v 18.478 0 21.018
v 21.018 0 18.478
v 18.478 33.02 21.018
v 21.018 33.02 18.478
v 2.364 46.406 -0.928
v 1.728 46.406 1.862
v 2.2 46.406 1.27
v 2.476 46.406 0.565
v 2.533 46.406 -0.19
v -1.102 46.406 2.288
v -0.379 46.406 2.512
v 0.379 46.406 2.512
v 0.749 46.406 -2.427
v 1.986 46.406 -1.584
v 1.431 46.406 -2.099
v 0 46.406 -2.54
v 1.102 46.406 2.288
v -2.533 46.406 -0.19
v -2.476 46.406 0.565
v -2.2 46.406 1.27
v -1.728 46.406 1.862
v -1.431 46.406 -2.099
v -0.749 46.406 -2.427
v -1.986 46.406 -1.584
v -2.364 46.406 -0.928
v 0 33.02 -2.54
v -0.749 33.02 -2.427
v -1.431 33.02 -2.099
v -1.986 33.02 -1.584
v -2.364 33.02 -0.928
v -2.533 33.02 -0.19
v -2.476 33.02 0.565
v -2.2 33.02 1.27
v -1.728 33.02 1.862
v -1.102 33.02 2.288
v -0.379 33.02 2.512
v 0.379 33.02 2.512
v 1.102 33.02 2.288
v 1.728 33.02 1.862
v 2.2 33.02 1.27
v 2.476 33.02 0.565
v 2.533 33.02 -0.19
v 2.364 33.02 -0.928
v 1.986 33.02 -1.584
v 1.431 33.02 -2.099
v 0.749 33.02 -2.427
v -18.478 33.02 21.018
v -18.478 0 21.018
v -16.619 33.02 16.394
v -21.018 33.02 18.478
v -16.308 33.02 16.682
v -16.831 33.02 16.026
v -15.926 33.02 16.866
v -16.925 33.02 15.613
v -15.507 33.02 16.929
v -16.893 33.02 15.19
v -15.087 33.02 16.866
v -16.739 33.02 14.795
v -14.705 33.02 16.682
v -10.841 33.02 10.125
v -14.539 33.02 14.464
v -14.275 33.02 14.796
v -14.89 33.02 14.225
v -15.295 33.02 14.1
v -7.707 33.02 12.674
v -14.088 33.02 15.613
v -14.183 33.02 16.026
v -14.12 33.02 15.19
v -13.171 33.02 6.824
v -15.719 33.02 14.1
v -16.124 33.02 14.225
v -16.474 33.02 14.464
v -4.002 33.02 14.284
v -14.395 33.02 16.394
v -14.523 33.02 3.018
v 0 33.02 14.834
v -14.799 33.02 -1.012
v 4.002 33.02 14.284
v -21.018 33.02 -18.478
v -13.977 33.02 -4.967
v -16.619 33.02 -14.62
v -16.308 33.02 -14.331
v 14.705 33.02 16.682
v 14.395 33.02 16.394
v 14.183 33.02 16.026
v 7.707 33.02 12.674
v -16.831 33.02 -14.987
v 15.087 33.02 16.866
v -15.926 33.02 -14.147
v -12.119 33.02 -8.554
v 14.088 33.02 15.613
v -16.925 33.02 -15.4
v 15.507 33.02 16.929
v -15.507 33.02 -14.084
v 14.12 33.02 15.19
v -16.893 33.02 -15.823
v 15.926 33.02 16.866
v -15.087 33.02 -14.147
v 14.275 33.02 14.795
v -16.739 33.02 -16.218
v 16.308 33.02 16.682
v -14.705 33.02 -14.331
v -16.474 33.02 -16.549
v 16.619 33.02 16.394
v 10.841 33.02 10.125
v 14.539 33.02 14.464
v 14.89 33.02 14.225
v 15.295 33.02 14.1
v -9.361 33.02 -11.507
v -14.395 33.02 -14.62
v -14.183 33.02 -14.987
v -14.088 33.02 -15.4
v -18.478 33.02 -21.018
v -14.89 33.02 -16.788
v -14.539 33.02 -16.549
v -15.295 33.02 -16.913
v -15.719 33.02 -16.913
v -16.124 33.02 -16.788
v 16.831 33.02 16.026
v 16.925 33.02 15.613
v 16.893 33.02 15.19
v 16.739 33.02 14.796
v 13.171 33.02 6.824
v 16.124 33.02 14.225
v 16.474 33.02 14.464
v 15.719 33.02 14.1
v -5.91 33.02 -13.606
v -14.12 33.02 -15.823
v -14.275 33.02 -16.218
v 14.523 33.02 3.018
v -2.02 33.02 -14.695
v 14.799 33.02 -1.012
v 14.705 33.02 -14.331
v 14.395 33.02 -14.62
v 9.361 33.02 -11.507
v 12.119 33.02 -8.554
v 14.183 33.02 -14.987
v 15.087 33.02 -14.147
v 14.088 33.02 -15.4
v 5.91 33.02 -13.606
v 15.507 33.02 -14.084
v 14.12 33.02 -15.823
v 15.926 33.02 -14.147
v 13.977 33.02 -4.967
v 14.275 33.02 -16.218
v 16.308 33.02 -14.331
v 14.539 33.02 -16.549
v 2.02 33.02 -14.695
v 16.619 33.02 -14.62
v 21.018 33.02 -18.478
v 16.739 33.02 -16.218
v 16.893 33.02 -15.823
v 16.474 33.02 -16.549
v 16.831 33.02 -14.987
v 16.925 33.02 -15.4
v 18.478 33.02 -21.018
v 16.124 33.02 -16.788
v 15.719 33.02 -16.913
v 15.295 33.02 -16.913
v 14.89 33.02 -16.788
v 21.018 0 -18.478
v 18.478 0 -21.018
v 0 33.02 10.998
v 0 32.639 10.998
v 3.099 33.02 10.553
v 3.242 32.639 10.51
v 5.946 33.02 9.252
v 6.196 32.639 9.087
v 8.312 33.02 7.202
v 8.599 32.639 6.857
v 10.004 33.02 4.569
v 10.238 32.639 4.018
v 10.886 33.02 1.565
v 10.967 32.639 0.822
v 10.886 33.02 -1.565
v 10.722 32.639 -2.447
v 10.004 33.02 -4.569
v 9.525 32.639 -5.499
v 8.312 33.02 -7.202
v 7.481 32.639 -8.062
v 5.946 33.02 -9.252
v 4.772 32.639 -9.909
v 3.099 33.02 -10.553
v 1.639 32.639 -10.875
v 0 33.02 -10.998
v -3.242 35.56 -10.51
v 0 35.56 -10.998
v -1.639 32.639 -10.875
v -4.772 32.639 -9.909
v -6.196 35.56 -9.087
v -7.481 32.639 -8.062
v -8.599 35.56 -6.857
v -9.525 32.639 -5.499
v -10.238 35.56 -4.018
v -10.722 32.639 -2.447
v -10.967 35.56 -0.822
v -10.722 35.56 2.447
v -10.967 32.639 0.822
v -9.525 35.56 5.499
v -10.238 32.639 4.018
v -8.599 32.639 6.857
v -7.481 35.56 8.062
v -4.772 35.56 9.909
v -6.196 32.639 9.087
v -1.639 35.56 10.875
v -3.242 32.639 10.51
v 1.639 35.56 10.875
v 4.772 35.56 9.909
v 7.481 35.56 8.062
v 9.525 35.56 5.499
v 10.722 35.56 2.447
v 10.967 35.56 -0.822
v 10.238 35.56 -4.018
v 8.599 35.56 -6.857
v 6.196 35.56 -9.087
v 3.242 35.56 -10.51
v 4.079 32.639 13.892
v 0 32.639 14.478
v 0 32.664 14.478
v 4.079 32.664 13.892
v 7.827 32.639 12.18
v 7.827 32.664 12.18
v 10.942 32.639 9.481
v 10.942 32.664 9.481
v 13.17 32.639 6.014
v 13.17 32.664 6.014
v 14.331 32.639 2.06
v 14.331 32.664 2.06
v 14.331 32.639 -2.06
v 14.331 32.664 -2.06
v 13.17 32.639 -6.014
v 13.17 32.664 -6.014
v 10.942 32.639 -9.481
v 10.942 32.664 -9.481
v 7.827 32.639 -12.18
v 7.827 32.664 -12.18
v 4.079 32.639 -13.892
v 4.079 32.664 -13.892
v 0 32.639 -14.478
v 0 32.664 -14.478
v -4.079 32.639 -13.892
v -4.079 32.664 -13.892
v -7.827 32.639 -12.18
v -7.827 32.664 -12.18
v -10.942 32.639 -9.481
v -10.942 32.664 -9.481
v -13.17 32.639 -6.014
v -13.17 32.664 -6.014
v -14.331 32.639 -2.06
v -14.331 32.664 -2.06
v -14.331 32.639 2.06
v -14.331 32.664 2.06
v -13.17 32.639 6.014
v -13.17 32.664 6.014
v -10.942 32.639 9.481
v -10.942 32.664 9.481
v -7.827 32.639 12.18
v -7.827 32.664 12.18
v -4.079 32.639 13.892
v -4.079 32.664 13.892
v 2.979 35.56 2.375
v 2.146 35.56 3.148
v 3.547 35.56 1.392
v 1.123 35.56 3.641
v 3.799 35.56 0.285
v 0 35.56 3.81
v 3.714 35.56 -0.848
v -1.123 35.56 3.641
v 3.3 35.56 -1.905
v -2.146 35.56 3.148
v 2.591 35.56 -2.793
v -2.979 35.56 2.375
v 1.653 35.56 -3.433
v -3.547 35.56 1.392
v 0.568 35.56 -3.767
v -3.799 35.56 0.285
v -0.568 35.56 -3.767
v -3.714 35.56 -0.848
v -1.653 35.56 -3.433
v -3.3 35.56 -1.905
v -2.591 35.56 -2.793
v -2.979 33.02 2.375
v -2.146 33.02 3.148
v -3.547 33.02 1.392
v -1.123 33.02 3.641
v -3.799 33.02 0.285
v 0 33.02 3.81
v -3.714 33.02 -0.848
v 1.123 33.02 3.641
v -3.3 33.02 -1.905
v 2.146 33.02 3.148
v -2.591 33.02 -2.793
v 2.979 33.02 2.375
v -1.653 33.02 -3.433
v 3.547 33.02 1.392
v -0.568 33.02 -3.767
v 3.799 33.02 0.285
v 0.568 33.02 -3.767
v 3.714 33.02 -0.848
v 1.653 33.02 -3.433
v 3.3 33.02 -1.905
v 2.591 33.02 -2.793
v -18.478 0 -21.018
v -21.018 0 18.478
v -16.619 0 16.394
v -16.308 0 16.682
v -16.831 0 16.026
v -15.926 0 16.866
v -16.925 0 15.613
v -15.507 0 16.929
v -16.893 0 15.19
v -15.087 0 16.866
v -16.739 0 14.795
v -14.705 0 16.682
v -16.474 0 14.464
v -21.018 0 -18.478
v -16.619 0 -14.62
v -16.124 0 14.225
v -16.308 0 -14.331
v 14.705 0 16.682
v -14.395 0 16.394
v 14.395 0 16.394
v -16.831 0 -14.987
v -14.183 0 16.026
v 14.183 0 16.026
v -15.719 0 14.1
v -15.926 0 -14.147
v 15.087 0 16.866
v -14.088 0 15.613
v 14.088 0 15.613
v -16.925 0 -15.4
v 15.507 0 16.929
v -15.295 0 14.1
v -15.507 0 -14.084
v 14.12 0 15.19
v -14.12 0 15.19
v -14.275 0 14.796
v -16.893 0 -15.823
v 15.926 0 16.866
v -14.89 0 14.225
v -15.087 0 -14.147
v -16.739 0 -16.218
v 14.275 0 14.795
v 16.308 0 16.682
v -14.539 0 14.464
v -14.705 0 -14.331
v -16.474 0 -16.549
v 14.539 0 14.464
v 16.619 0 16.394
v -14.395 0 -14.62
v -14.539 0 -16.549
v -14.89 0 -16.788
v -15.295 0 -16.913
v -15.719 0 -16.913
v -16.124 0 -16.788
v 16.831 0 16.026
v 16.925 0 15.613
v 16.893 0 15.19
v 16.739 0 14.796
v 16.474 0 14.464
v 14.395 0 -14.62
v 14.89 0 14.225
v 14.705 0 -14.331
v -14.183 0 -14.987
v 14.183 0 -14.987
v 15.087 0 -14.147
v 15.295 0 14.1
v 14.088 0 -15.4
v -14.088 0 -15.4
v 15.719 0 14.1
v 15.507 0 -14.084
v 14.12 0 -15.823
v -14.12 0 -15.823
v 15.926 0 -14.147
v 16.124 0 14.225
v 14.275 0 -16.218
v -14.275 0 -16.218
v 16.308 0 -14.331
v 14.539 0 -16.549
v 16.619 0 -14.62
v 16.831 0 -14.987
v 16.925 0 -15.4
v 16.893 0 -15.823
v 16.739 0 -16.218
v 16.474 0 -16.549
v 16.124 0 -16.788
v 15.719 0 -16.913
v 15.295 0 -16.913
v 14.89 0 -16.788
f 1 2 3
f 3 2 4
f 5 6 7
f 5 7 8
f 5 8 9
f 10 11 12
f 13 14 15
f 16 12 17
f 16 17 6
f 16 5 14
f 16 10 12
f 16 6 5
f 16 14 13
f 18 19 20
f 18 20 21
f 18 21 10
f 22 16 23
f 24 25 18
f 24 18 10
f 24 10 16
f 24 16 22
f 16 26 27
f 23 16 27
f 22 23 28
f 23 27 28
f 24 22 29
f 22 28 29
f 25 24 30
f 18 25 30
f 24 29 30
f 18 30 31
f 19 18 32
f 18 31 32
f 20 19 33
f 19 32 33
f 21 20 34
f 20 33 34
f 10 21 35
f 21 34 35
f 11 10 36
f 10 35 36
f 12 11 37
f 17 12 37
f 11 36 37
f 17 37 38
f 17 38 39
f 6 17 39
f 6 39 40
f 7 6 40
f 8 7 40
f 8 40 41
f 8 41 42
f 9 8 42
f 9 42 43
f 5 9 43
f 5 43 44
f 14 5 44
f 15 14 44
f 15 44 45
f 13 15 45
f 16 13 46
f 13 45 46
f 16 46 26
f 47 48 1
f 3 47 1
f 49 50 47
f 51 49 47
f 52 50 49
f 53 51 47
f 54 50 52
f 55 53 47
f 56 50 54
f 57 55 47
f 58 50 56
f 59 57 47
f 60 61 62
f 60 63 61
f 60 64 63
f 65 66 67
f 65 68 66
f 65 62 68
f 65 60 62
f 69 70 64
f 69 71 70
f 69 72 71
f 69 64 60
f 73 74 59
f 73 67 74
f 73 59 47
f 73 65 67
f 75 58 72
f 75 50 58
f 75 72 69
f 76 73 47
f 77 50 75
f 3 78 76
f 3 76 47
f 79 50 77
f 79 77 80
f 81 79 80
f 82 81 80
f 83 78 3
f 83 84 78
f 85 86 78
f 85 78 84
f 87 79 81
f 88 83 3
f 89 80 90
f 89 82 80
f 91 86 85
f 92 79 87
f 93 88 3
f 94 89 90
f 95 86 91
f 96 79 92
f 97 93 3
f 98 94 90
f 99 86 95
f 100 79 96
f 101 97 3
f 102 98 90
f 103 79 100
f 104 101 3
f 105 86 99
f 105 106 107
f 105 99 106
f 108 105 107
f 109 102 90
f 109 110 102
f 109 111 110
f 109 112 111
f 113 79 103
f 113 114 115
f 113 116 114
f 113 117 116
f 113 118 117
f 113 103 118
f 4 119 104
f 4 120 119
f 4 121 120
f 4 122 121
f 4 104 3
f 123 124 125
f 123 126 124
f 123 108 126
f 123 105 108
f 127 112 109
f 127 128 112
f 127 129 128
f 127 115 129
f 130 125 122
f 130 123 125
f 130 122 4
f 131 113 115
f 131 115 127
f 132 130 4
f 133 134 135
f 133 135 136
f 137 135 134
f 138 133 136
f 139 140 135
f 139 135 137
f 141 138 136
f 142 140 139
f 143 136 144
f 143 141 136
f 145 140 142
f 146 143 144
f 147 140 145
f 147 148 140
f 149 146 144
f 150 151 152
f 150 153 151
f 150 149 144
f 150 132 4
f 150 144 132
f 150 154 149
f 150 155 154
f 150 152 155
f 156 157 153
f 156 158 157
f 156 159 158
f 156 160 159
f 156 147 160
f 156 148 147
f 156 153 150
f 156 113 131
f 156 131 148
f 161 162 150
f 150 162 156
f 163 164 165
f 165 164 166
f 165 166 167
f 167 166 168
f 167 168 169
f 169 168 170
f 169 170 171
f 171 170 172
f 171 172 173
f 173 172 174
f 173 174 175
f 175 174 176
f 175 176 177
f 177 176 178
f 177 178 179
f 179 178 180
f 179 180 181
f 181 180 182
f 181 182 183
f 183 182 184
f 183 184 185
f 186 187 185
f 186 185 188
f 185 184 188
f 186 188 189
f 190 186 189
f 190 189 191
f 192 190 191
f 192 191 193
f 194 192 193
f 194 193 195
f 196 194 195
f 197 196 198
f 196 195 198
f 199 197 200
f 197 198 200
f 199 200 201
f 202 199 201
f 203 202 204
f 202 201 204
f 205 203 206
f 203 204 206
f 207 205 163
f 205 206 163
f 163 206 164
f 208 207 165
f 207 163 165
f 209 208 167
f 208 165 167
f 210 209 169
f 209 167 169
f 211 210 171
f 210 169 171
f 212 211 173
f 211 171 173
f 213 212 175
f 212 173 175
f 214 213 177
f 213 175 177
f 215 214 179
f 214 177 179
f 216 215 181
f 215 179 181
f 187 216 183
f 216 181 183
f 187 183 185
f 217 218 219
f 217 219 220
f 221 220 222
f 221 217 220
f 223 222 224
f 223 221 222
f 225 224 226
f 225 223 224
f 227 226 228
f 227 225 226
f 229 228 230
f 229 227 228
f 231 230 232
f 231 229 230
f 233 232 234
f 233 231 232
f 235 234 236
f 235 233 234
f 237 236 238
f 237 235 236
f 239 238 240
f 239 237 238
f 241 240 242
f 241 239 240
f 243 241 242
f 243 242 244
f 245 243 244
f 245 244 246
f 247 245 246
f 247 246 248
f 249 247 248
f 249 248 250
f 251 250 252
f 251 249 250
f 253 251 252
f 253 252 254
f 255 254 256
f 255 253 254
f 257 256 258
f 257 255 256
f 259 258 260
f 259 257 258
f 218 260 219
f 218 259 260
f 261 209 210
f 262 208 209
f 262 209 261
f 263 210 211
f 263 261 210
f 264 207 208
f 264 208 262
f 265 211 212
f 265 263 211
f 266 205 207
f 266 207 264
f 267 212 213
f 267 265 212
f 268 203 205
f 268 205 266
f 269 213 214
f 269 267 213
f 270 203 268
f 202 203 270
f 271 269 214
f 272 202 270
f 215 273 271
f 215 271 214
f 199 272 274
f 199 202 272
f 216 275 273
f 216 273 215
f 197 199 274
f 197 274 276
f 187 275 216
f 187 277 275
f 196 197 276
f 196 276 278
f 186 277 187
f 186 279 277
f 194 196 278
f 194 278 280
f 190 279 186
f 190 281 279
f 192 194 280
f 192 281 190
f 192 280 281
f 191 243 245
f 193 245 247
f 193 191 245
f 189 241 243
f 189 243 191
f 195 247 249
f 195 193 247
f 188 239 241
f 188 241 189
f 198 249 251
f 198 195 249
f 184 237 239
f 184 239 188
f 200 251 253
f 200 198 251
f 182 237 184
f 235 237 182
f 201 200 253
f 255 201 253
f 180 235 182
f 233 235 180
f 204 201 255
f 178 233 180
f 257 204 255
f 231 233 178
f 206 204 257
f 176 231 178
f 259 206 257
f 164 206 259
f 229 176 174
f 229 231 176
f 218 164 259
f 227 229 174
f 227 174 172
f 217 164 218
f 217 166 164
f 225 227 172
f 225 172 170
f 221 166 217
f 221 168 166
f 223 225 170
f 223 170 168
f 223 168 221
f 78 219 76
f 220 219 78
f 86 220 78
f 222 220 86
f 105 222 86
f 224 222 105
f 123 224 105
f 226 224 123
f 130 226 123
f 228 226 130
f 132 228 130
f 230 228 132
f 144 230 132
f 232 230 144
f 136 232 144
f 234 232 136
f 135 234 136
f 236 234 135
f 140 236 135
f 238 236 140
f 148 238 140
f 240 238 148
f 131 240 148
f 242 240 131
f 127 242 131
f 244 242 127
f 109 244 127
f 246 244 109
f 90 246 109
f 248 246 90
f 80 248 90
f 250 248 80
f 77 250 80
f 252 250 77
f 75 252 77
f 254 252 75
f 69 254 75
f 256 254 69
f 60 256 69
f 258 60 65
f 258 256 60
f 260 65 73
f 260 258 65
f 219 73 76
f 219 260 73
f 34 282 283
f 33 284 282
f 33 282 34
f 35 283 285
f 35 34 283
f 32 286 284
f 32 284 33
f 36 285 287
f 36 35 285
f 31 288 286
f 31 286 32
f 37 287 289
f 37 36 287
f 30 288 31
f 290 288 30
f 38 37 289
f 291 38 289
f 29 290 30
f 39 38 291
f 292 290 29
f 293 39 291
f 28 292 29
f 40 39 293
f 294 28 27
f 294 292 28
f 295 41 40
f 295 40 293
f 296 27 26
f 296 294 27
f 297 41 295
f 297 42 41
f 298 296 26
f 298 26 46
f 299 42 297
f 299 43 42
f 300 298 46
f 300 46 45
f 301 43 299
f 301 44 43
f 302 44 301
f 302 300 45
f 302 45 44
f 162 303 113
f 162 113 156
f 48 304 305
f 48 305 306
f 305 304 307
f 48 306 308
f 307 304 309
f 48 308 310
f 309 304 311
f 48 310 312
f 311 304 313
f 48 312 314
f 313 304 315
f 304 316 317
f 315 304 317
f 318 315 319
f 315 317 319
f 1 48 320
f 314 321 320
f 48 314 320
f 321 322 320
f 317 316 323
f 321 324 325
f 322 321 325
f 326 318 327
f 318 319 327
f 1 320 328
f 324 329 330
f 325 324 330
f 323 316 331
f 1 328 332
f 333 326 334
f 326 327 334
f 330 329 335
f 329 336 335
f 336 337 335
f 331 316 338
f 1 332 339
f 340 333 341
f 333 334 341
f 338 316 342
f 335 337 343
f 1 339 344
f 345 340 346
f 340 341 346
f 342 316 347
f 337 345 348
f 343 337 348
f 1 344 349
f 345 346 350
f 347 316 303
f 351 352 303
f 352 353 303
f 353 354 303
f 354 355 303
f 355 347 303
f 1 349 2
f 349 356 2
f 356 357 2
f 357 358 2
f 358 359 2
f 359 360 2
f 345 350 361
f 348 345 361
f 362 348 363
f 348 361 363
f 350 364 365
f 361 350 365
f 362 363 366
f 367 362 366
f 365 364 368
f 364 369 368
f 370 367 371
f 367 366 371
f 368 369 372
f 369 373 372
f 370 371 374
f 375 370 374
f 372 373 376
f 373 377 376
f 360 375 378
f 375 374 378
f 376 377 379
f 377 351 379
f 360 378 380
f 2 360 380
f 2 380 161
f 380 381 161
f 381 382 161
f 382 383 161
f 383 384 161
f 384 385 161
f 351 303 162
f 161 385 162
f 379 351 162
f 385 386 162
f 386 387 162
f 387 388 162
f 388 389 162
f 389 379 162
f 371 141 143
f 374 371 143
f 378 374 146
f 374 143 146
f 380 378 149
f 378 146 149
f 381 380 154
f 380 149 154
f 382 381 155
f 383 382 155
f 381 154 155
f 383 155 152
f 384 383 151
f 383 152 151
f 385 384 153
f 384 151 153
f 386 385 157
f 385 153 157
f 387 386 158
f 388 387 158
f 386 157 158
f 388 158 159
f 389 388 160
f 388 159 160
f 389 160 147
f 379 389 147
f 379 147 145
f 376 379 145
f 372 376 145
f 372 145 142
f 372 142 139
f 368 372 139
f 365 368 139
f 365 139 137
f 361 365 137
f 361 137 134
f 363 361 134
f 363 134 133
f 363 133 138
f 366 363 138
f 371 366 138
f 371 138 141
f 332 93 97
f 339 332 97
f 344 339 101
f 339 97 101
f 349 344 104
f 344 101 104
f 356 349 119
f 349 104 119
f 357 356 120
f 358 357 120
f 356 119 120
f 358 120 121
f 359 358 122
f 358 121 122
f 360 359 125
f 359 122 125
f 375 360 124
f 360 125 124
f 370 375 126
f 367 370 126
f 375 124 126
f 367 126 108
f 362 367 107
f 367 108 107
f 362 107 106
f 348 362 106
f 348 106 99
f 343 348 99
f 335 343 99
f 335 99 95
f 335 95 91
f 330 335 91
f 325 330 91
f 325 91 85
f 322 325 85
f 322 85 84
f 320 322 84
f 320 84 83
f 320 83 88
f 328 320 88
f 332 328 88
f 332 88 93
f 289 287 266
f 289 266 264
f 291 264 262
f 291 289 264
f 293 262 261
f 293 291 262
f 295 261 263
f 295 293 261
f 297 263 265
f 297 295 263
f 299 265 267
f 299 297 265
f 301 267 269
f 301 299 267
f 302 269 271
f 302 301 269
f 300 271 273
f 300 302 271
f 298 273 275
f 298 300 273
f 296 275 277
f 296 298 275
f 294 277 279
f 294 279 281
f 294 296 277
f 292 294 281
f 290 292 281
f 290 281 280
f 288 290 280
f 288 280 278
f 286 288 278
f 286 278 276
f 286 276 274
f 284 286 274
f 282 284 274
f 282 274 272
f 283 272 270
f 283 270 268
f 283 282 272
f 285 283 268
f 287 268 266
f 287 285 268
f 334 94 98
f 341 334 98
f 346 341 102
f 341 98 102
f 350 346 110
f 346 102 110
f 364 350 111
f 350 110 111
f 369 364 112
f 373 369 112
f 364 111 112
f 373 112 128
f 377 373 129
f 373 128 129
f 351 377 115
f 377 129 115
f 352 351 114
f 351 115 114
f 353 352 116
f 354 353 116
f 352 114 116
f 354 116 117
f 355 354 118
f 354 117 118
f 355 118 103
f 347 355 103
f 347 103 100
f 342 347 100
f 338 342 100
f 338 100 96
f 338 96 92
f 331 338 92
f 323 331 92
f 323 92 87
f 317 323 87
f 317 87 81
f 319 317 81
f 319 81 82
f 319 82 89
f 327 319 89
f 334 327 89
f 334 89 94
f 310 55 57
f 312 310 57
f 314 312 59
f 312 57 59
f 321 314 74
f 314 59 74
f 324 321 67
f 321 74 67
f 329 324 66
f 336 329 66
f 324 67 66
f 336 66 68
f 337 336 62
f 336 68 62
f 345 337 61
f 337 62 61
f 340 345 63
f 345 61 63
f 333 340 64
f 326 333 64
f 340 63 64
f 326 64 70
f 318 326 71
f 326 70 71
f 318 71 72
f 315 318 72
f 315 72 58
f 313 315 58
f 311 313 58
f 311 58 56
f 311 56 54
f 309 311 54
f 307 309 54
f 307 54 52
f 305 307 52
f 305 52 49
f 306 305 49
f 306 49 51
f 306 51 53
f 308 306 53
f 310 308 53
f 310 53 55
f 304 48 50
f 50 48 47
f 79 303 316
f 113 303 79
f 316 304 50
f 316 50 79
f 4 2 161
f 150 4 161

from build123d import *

# Parameters (mm, degrees)
SKETCH1_W           = 42.037
SKETCH1_H           = 42.037
BOSS_EXTRUDE1_DEPTH = 33.02
CHAMFER1_SIZE       = 2.54
SKETCH2_R           = 10.9982
SKETCH2_R_2         = 3.81
BOSS_EXTRUDE2_DEPTH = 2.54
CUT_EXTRUDE1_START  = -0.381
SKETCH3_R           = 14.478
SKETCH3_R_2         = 10.9982
CUT_EXTRUDE1_DEPTH  = 0.381
CHAMFER2_SIZE       = 0.3556
SKETCH4_R           = 2.54
BOSS_EXTRUDE3_DEPTH = 13.3858
SKETCH5_R           = 1.4224
CUT_EXTRUDE2_DEPTH  = 45.428313996


with BuildPart() as part:
    # Sketch1 → Boss-Extrude1 (new body)
    with BuildSketch(Plane(origin=(0, 0, 0), x_dir=(1, 0, 0), z_dir=(0, 1, 0))):
        Rectangle(SKETCH1_W, SKETCH1_H)
    extrude(amount=BOSS_EXTRUDE1_DEPTH)

    # Chamfer1
    chamfer1_edges = [part.edges().sort_by_distance(p)[0] for p in [
        (21.0185, 16.51, 21.0185),
        (-21.0185, 16.51, 21.0185),
        (-21.0185, 16.51, -21.0185),
        (21.0185, 16.51, -21.0185),
    ]]
    chamfer(chamfer1_edges, length=CHAMFER1_SIZE)

    # Sketch2 → Boss-Extrude2 (add)
    with BuildSketch(Plane(origin=(0, 33.02, 0), x_dir=(1, 0, 0), z_dir=(0, 1, 0))):
        with Locations(Location((0, 0, 0), (0, 0, 90))):
            Circle(SKETCH2_R)
        with Locations(Location((0, 0, 0), (0, 0, 270))):
            Circle(SKETCH2_R_2, mode=Mode.SUBTRACT)
    extrude(amount=BOSS_EXTRUDE2_DEPTH)

    # Sketch3 → Cut-Extrude1 (cut)
    with BuildSketch(Plane(origin=(0, 33.02, 0), x_dir=(1, 0, 0), z_dir=(0, 1, 0)).offset(CUT_EXTRUDE1_START)):
        with Locations(Location((0, 0, 0), (0, 0, 270))):
            Circle(SKETCH3_R)
        with Locations(Location((0, 0, 0), (0, 0, 270))):
            Circle(SKETCH3_R_2, mode=Mode.SUBTRACT)
    extrude(amount=CUT_EXTRUDE1_DEPTH, mode=Mode.SUBTRACT)

    # Chamfer2
    chamfer2_edges = [part.edges().sort_by_distance(p)[0] for p in [
        (0, 33.02, -14.478),
    ]]
    chamfer(chamfer2_edges, length=CHAMFER2_SIZE)

    # Sketch4 → Boss-Extrude3 (add)
    with BuildSketch(Plane(origin=(0, 33.02, 0), x_dir=(1, 0, 0), z_dir=(0, 1, 0))):
        with Locations(Location((0, 0, 0), (0, 0, 90))):
            Circle(SKETCH4_R)
    extrude(amount=BOSS_EXTRUDE3_DEPTH)

    # Sketch5 → Cut-Extrude2 (cut, through all)
    with BuildSketch(Plane(origin=(0, 33.02, 0), x_dir=(1, 0, 0), z_dir=(0, 1, 0))):
        with Locations(Location((-15.5067, 15.5067, 0), (0, 0, 270))):
            Circle(SKETCH5_R)
        with Locations(Location((15.5067, 15.5067, 0), (0, 0, 270))):
            Circle(SKETCH5_R)
        with Locations(Location((-15.5067, -15.5067, 0), (0, 0, 270))):
            Circle(SKETCH5_R)
        with Locations(Location((15.5067, -15.5067, 0), (0, 0, 270))):
            Circle(SKETCH5_R)
    extrude(amount=-CUT_EXTRUDE2_DEPTH, mode=Mode.SUBTRACT)


solid = part.part
